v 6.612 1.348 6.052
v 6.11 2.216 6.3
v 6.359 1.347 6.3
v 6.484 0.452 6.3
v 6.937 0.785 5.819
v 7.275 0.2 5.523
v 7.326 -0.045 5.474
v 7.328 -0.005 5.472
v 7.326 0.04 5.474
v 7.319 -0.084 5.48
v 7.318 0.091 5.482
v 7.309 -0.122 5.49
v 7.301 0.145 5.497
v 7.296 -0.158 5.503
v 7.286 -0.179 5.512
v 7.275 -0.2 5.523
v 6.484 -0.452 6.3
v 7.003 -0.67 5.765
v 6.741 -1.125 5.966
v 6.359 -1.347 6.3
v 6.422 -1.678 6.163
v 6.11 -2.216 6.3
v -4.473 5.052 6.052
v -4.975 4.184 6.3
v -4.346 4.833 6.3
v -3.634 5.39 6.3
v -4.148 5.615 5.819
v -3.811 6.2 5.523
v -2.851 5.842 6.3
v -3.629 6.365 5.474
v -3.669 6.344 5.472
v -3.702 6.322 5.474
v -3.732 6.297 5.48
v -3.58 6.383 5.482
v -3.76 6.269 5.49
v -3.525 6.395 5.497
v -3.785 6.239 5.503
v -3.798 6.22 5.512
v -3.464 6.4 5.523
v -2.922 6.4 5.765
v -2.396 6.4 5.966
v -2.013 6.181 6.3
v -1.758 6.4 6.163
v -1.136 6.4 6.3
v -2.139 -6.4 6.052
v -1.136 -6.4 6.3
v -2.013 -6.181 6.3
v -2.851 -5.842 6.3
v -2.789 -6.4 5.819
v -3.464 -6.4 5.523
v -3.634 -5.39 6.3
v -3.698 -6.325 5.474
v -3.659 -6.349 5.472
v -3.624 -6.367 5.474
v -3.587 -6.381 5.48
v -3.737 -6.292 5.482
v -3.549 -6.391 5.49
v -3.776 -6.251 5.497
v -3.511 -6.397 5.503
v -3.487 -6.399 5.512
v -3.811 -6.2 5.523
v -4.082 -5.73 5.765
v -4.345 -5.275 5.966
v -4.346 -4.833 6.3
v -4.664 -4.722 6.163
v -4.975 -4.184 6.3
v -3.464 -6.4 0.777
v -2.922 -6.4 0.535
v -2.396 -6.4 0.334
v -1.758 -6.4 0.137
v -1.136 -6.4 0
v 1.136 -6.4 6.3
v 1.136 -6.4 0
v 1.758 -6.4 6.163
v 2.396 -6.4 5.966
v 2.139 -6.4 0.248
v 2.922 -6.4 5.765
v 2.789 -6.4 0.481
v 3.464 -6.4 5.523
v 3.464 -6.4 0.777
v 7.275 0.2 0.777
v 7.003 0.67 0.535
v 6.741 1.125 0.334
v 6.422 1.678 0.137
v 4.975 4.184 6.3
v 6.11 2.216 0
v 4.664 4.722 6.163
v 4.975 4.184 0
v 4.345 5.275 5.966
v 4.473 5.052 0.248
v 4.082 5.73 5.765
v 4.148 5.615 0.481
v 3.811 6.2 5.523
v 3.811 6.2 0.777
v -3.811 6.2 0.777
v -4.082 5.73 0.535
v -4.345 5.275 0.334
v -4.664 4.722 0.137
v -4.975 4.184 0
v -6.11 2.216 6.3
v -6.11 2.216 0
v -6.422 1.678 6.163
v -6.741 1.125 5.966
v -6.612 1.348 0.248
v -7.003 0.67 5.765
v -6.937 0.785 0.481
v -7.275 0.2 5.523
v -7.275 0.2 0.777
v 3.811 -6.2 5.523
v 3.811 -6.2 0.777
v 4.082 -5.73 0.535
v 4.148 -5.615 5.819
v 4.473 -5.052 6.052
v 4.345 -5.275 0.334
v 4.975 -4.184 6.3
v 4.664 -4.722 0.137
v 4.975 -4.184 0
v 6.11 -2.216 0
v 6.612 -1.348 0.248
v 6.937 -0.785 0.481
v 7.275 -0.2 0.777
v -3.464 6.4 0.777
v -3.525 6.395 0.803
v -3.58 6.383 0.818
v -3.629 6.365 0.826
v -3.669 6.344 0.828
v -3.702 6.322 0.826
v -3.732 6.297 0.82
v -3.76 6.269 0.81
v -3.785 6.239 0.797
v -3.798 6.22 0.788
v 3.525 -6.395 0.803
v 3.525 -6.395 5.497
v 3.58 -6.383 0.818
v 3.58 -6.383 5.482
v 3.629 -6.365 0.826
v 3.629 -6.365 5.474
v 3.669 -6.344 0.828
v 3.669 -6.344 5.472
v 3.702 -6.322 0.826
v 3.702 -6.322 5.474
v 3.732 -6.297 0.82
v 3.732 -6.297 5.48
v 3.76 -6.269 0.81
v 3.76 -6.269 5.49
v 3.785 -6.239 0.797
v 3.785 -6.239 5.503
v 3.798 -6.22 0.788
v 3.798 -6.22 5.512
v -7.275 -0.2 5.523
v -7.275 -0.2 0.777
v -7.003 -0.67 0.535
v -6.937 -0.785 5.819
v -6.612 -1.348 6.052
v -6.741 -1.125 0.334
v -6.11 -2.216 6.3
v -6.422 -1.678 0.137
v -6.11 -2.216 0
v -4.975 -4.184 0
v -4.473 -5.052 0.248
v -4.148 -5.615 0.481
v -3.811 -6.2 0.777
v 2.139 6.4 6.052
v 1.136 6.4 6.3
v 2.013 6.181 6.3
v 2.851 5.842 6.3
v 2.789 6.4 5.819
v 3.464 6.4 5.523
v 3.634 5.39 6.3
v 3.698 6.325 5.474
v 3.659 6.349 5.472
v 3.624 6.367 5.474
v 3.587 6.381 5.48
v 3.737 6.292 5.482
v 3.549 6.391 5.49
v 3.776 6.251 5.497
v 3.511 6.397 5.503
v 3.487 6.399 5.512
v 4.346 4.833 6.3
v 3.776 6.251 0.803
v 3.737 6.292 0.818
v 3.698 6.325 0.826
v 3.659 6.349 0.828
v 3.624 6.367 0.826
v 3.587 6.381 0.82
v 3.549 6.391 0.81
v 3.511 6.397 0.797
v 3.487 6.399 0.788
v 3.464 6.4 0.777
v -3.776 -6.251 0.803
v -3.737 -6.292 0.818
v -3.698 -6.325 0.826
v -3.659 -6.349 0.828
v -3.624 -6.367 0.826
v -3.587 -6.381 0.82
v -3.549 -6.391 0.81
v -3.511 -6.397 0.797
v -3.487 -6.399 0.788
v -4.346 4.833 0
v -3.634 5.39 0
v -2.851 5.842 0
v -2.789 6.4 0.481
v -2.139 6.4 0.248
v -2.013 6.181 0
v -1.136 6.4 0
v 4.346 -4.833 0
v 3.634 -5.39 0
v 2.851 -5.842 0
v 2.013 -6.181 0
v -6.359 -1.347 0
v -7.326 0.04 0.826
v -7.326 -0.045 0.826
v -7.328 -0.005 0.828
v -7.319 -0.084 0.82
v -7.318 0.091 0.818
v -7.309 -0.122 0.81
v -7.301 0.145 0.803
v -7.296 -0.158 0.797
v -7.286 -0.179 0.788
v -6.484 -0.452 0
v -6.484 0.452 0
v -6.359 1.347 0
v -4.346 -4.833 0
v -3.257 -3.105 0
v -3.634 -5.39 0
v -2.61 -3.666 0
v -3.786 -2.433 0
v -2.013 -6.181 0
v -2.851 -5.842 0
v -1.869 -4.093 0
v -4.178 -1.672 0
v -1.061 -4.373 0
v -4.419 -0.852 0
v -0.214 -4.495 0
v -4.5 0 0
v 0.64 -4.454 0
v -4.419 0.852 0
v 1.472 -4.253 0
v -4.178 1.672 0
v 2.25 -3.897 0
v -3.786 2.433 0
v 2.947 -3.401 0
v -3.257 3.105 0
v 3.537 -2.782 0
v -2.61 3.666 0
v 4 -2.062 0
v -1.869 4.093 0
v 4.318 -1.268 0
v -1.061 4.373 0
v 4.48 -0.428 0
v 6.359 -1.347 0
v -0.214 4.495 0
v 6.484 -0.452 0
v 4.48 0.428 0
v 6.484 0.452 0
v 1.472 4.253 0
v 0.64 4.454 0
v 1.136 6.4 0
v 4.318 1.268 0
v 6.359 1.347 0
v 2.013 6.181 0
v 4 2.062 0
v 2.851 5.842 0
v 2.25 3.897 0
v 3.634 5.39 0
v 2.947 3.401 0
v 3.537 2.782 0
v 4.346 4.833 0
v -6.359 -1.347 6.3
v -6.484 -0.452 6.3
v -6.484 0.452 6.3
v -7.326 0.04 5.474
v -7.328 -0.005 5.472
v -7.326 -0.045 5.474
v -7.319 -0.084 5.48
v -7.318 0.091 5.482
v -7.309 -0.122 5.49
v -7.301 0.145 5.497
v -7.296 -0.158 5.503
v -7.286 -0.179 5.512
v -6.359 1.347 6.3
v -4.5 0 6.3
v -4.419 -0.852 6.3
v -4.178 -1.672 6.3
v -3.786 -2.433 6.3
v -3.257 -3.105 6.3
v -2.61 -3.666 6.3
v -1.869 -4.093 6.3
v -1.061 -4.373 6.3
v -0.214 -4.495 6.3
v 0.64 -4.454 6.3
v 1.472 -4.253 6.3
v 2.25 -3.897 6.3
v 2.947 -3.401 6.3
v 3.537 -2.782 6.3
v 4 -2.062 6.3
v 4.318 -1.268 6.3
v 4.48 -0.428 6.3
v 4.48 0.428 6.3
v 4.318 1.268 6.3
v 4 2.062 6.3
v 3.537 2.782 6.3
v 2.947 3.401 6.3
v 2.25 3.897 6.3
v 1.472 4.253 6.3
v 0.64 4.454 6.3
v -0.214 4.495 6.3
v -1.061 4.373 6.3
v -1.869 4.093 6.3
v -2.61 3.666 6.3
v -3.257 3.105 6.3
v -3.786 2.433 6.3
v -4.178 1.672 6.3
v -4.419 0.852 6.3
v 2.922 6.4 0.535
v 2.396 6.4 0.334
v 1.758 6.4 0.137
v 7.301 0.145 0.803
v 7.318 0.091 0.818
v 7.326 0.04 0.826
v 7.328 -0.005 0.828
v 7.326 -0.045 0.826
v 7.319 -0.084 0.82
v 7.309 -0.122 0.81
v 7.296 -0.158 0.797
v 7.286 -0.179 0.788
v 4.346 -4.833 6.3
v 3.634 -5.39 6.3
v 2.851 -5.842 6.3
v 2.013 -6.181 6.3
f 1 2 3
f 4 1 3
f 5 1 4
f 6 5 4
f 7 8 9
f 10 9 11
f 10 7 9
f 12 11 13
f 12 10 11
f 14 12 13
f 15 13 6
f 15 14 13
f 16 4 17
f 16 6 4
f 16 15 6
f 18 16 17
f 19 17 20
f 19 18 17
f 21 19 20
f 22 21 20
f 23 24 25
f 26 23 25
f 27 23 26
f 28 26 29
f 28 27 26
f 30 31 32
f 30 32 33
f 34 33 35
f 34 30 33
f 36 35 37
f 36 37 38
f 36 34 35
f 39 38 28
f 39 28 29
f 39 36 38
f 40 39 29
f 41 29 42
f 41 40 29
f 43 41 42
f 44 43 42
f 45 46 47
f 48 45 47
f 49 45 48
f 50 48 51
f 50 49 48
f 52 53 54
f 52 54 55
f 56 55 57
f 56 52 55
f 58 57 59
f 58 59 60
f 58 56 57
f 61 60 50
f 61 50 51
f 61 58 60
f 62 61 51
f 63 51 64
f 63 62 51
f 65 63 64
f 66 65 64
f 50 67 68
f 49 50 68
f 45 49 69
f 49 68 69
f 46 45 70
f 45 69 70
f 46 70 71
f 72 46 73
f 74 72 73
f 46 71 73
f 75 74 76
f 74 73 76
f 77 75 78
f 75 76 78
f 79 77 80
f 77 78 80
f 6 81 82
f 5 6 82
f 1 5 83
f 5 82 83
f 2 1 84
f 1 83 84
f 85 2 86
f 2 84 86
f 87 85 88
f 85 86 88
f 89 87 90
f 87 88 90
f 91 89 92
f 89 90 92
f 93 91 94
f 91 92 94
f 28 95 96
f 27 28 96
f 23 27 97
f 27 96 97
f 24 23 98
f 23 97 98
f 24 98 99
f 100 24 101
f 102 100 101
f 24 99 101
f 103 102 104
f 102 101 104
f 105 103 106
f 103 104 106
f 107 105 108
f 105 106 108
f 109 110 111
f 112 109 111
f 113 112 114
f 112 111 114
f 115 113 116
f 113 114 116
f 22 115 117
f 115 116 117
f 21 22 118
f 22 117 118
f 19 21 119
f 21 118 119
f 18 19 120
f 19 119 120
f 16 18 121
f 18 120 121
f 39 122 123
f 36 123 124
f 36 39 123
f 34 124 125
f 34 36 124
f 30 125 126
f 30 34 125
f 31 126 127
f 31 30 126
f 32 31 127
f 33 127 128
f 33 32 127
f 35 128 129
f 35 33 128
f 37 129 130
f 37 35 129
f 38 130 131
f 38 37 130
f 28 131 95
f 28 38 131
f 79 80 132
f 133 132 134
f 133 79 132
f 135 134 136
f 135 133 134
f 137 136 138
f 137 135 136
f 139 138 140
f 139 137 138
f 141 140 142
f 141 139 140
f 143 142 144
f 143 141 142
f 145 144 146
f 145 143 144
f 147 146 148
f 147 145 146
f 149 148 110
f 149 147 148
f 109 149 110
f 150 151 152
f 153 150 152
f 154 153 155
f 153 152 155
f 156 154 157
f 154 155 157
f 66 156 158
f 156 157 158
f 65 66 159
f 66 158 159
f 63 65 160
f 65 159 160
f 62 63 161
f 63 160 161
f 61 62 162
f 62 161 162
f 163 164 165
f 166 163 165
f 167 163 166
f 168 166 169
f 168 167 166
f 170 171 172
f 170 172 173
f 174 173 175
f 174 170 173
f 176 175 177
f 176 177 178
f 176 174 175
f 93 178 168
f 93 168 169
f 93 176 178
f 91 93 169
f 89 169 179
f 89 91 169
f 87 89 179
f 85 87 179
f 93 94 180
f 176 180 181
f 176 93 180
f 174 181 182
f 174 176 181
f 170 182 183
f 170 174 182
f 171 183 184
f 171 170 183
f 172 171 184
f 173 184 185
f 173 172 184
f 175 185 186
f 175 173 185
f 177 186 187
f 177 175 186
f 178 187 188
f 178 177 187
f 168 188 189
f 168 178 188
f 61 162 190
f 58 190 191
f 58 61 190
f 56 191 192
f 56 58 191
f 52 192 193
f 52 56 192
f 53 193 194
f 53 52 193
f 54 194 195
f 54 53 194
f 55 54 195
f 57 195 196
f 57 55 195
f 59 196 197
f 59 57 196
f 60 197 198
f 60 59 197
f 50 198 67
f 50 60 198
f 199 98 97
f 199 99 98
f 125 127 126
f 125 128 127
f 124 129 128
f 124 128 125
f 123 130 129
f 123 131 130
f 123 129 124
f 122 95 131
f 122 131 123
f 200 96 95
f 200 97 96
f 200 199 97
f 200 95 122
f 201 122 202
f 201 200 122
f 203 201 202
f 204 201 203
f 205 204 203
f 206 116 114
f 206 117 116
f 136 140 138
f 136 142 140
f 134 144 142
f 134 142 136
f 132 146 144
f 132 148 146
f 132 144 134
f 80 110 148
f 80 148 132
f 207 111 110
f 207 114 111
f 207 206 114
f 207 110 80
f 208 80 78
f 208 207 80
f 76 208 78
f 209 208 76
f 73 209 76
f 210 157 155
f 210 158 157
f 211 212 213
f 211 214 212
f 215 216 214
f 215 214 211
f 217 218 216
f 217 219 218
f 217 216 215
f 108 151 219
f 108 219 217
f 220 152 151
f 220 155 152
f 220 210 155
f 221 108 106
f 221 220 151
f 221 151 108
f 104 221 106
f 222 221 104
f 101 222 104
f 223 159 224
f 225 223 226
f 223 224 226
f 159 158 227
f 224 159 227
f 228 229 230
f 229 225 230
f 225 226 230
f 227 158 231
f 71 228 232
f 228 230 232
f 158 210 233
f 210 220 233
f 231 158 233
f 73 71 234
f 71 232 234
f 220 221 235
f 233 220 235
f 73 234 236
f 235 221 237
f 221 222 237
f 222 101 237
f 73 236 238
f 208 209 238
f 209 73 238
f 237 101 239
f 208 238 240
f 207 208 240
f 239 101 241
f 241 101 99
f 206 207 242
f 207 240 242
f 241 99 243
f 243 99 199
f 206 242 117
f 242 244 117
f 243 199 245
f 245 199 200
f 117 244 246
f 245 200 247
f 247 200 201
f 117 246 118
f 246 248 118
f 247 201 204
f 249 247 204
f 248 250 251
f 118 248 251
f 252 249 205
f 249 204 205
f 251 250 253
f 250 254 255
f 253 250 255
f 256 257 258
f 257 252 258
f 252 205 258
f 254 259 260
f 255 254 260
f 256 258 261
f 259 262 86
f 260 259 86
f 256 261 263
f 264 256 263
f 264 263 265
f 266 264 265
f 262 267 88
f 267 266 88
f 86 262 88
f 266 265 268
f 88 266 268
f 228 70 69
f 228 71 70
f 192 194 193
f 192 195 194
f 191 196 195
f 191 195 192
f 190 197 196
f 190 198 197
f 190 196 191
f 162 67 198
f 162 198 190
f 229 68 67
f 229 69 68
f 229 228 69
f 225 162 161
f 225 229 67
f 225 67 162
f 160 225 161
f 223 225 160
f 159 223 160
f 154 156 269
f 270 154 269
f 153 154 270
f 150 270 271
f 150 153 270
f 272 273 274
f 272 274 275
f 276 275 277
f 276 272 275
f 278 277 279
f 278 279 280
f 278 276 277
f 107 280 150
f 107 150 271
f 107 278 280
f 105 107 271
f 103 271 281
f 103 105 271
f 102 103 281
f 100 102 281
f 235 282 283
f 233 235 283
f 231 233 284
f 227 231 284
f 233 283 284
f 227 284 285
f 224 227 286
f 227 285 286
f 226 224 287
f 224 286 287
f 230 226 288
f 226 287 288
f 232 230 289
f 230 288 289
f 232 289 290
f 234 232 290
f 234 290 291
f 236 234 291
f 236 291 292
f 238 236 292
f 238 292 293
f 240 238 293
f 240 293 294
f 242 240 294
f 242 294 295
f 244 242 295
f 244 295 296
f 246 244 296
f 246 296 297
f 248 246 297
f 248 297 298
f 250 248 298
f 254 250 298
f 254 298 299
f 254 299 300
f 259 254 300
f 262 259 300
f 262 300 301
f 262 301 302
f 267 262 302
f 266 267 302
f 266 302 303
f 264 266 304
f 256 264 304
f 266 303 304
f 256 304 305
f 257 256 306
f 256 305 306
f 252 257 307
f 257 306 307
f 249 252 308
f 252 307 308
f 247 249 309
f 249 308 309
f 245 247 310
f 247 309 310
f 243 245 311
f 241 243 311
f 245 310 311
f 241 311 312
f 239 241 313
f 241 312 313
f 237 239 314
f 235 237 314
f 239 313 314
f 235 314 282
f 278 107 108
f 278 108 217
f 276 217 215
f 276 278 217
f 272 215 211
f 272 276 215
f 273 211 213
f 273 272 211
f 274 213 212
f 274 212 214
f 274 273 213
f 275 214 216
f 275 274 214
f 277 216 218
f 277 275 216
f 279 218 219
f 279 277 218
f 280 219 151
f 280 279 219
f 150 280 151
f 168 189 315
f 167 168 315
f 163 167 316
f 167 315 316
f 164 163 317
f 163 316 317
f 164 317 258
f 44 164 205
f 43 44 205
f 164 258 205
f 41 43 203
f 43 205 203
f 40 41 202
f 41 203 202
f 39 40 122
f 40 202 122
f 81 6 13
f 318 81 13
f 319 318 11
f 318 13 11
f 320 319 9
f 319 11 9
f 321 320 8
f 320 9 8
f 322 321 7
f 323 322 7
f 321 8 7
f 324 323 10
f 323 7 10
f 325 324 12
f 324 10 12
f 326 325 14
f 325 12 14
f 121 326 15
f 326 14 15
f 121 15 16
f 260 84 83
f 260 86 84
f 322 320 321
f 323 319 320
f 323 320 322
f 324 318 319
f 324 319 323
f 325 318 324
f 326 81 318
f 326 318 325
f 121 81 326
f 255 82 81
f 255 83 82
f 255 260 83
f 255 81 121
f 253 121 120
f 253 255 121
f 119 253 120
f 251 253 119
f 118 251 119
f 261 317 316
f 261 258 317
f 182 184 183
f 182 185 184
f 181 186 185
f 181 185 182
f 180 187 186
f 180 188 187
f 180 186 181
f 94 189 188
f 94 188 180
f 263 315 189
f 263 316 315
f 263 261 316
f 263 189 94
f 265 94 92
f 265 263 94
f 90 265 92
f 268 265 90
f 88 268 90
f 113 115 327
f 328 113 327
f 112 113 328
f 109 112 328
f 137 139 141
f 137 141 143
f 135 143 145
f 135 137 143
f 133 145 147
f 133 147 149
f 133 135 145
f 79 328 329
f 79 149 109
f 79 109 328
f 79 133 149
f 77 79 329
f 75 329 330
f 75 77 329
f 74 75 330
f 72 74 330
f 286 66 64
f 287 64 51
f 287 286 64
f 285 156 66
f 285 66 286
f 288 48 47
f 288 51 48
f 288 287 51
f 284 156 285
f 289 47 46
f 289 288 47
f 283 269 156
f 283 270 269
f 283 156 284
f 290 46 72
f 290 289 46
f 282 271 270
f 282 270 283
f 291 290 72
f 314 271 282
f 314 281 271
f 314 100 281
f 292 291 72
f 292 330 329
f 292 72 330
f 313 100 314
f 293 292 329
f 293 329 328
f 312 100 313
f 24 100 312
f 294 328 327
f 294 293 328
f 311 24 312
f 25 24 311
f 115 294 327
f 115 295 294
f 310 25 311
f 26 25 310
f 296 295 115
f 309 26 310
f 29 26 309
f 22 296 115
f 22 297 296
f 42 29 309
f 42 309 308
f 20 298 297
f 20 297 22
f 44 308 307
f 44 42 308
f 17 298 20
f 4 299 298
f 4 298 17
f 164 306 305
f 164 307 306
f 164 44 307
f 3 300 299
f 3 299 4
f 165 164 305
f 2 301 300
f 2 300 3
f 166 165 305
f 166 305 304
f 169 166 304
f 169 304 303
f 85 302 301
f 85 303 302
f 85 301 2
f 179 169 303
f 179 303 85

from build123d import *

# Parameters (mm, degrees)
F1_DEPTH = 6.3
F2_R     = 0.4
F5_D     = 9


with BuildPart() as f1:
    # F0 (on Top) → F1 (new body)
    with BuildSketch(Plane.XY):
        Polygon((7.3900834456, 0), (3.6950417228, 6.4), (-3.6950417228, 6.4), (-7.3900834456, 0), (-3.6950417228, -6.4), (3.6950417228, -6.4), align=None)
    extrude(amount=F1_DEPTH)

    # F2
    f2_edges = [f1.edges().sort_by_distance(p)[0] for p in [
        (-3.695042, -6.4, 3.15),
        (3.695042, -6.4, 3.15),
        (7.390083, 0, 3.15),
        (3.695042, 6.4, 3.15),
        (-3.695042, 6.4, 3.15),
        (-7.390083, 0, 3.15),
    ]]
    fillet(f2_edges, radius=F2_R)

    # F3 (on Right) → F4 (revolve, cut)
    with BuildSketch(Plane.YZ):
        Polygon((9.5, 6.3), (6.5, 6.3), (9.5, 3.3), align=None)
        Polygon((9.5, 3), (6.5, 0), (9.5, 0), align=None)
    revolve(axis=Axis((0, 0, 10.4480586015), (0, 0, -1)), mode=Mode.SUBTRACT)

    # F5 (through all)
    with Locations(Plane(origin=(0, 0, 0), x_dir=(1, 0, 0), z_dir=(0, 0, -1))):
        with Locations((0, 0)):
            Hole(F5_D / 2)


solid = f1.part
